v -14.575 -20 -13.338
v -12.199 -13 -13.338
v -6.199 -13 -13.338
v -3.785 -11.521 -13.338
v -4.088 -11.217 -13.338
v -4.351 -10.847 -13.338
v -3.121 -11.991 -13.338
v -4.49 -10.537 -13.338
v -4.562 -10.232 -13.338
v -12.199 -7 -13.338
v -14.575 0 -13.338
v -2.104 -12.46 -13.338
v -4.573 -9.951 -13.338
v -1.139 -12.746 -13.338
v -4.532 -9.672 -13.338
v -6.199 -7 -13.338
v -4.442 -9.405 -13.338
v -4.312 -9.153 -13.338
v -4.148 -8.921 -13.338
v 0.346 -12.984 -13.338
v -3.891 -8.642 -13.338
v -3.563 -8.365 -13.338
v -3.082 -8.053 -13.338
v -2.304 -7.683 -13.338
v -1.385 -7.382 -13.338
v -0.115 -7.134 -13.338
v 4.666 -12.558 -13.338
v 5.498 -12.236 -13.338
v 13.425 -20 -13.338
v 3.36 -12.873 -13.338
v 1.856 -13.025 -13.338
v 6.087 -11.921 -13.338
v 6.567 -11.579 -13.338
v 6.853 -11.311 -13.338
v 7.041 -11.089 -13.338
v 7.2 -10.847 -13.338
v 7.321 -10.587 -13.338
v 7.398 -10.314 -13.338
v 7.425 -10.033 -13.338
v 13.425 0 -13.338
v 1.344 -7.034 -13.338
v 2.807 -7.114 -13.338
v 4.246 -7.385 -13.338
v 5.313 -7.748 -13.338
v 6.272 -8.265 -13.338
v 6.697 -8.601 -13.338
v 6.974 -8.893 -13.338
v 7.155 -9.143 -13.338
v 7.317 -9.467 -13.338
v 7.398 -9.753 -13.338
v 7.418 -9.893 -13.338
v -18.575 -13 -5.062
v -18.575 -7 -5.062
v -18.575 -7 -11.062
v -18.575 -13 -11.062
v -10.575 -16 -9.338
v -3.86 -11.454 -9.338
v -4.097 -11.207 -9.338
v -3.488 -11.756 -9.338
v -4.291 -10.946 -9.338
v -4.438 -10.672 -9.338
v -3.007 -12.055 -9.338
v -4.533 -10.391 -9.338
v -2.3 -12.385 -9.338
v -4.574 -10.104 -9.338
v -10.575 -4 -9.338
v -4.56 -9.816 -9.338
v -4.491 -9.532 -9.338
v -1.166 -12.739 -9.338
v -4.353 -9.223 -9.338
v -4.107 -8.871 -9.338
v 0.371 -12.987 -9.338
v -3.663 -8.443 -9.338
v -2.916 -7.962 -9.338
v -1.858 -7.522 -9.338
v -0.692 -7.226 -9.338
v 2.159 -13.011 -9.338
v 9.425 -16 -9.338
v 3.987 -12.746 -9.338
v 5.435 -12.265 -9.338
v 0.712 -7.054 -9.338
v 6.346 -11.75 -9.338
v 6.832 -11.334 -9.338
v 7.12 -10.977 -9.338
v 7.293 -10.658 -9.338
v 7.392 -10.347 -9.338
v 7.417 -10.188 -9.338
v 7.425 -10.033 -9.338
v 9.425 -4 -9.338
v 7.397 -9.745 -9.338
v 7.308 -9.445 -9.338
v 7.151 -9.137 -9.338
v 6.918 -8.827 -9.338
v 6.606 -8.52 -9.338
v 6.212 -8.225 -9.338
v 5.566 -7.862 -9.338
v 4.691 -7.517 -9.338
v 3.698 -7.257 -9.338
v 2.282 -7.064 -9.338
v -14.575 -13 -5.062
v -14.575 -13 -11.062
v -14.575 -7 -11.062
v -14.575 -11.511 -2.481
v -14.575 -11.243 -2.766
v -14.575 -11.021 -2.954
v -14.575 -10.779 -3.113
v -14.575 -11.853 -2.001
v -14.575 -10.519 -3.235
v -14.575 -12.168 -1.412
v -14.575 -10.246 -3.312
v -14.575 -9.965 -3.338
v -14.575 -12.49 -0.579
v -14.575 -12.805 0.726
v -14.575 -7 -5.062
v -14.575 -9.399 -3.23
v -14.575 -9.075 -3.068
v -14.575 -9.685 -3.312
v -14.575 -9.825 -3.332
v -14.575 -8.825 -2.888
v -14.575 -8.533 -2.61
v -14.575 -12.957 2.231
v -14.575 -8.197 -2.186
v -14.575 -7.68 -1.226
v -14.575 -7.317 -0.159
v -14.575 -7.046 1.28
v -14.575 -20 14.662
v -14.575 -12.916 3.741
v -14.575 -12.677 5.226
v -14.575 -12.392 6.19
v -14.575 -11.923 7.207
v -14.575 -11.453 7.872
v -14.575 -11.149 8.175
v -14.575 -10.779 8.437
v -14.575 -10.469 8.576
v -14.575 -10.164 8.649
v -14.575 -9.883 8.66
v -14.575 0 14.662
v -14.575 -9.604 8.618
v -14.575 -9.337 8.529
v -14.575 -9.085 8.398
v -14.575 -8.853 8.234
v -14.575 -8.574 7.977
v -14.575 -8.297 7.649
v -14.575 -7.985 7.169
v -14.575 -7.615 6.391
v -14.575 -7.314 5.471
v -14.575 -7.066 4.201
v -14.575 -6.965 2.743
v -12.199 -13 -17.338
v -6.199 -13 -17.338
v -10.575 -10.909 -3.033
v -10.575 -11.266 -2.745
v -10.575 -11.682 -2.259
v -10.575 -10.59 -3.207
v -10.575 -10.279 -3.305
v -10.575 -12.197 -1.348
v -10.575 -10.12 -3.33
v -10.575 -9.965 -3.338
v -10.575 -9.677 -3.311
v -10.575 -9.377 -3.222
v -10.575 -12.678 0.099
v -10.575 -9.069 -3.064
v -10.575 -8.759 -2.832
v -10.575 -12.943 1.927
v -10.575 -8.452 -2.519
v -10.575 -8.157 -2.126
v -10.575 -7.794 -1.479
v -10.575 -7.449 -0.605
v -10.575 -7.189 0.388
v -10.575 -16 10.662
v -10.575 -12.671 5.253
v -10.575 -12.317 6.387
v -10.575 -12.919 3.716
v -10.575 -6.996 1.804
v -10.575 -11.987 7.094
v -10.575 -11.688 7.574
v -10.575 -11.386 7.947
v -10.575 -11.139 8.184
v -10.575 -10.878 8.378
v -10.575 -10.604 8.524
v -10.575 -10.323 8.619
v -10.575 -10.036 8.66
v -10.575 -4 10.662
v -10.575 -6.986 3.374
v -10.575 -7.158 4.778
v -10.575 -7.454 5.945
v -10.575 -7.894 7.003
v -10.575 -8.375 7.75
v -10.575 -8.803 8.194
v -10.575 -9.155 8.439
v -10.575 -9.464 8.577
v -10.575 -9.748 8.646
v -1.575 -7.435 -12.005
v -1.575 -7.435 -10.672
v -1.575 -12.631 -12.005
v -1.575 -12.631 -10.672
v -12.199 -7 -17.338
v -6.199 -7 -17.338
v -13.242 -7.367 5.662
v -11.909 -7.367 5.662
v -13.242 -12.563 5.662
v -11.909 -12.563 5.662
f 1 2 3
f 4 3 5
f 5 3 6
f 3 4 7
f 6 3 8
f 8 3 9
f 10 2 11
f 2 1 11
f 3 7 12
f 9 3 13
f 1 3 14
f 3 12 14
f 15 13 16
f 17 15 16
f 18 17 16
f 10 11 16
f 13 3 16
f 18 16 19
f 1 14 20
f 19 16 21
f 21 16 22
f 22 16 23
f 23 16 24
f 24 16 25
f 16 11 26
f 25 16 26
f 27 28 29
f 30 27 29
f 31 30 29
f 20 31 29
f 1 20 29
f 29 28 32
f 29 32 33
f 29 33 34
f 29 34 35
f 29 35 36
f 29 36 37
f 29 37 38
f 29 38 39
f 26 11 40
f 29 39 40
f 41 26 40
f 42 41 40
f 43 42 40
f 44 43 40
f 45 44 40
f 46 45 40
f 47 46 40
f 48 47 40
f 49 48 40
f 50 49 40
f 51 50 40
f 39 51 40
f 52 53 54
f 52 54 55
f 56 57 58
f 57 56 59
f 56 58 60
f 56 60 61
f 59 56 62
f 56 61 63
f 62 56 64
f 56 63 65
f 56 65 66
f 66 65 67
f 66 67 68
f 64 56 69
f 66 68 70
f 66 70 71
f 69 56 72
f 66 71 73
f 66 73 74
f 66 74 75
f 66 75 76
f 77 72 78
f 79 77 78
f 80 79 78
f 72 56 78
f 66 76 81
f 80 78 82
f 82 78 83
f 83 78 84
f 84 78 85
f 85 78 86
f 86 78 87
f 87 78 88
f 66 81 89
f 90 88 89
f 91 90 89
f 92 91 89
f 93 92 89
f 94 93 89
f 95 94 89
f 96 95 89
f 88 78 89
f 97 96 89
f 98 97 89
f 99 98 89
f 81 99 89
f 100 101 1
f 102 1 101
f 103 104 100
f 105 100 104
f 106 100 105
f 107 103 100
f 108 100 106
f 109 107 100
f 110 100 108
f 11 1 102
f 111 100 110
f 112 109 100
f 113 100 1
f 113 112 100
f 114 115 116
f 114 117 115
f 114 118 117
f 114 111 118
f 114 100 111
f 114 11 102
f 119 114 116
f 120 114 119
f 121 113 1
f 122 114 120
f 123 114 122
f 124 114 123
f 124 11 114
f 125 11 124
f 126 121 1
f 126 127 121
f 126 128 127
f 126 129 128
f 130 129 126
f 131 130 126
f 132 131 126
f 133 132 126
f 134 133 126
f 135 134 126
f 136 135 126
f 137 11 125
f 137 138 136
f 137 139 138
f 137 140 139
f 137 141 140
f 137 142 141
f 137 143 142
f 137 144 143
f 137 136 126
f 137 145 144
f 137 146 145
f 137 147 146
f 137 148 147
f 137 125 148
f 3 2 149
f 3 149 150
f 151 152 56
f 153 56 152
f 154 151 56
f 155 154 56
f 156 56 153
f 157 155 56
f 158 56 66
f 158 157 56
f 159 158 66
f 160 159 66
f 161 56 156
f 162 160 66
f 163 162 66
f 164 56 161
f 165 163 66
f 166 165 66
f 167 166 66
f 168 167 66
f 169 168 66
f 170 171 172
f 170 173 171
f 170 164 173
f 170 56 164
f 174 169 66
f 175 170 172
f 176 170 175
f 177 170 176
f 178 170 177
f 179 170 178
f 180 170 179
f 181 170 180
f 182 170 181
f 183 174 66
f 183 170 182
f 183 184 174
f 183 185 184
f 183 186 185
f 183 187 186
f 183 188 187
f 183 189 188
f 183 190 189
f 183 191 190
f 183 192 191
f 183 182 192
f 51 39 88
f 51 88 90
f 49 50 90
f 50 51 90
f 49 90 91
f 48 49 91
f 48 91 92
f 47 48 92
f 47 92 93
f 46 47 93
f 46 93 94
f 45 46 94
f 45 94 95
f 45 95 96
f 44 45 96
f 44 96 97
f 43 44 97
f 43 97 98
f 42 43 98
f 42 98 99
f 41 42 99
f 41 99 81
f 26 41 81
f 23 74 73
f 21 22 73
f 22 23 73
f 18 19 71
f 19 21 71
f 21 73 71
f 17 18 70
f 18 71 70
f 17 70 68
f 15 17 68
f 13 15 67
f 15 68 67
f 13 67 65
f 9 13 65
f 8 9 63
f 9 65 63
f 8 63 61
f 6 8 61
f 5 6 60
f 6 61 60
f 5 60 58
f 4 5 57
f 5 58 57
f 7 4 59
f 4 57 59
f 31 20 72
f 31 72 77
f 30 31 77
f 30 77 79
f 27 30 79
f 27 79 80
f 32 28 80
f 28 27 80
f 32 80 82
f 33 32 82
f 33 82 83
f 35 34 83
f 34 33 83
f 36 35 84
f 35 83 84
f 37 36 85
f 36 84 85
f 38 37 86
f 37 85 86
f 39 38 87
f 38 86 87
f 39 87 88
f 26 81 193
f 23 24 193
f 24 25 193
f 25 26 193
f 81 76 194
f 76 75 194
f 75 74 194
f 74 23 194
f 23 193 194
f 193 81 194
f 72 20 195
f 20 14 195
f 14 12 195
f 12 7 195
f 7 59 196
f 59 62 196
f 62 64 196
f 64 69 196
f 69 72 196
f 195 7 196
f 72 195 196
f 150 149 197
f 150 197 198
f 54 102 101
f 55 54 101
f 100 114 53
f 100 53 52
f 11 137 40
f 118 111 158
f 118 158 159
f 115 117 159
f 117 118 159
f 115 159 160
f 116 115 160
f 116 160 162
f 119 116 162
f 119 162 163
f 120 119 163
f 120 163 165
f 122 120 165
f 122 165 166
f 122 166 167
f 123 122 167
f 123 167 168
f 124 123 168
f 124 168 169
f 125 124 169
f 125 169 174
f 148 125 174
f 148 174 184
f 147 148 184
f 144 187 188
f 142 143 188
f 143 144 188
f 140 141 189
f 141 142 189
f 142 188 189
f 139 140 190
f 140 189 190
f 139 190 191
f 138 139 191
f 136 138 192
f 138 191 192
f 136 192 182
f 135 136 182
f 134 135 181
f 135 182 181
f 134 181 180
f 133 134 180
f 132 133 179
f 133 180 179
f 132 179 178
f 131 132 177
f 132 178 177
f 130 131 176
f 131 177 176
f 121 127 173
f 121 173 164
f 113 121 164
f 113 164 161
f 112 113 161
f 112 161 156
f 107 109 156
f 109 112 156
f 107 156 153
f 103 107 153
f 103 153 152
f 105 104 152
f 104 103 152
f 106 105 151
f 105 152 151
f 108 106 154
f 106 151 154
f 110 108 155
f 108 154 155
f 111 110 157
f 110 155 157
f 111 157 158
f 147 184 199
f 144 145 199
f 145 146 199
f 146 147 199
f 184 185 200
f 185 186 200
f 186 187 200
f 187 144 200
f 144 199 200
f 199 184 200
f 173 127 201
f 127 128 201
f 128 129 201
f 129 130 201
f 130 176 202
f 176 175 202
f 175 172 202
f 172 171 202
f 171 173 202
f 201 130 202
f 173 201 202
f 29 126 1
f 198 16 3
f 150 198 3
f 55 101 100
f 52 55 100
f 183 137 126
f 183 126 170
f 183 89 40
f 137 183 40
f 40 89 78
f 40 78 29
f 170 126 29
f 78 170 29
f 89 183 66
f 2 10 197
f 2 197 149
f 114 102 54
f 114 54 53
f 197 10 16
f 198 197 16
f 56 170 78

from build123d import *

# Parameters (mm, degrees)
F0_W      = 28
F0_H      = 28
F1_DEPTH  = 20
F2_W      = 20
F2_H      = 12
F3_DEPTH  = 24
F4_W      = 12
F4_H      = 20
F5_DEPTH  = 24
F7_DEPTH  = 20.001
F9_DEPTH  = 4.001
F11_DEPTH = 4.001
F12_W     = 6
F12_H     = 6
F13_DEPTH = 4
F14_W     = 6
F14_H     = 6
F15_DEPTH = 4


with BuildPart() as f1:
    # F0 (on Front) → F1 (new body)
    with BuildSketch(Plane.XZ):
        with Locations((-0.575359, 0.661765)):
            Rectangle(F0_W, F0_H)
    extrude(amount=F1_DEPTH)

    # F2 (on face) → F3 (cut)
    with BuildSketch(Plane.XY.offset(14.661765)):
        with Locations((-0.575359, -10)):
            Rectangle(F2_W, F2_H)
    extrude(amount=-F3_DEPTH, mode=Mode.SUBTRACT)

    # F4 (on face) → F5 (cut)
    with BuildSketch(Plane.YZ.offset(13.424641)):
        with Locations((-10, 0.661765)):
            Rectangle(F4_W, F4_H)
    extrude(amount=-F5_DEPTH, mode=Mode.SUBTRACT)

    # F6 (on face) → F7 (cut, through all)
    with BuildSketch(Plane.XZ.offset(20)):
        Polygon((13.424641, 14.661765), (-14.575359, 14.661765), (13.424641, -13.338235), align=None)
    extrude(amount=-F7_DEPTH, mode=Mode.SUBTRACT)

    # F8 (on face) → F9 (cut, through all)
    with BuildSketch(Plane.XY.offset(-9.338235)):
        with BuildLine():
            add(Edge.make_bspline(
                [(7.424687, -10.033242), (7.424687, -4.83709), (-1.575313, -7.435166), (-10.575313, -10.033242), (-1.575313, -12.631319), (7.424687, -15.229395), (7.424687, -10.033242)],
                knots=[0, 0, 0, 2.094395, 2.094395, 4.18879, 4.18879, 6.283185, 6.283185, 6.283185], degree=2, weights=[1, 0.5, 1, 0.5, 1, 0.5, 1]))
        make_face()
    extrude(amount=-F9_DEPTH, mode=Mode.SUBTRACT)

    # F10 (on face) → F11 (cut, through all)
    with BuildSketch(Plane.YZ.offset(-10.575359)):
        with BuildLine():
            add(Edge.make_bspline(
                [(-9.965221, -3.338235), (-4.769069, -3.338235), (-7.367145, 5.661765), (-9.965221, 14.661765), (-12.563298, 5.661765), (-15.161374, -3.338235), (-9.965221, -3.338235)],
                knots=[0, 0, 0, 2.094395, 2.094395, 4.18879, 4.18879, 6.283185, 6.283185, 6.283185], degree=2, weights=[1, 0.5, 1, 0.5, 1, 0.5, 1]))
        make_face()
    extrude(amount=-F11_DEPTH, mode=Mode.SUBTRACT)

    # F12 (on face) → F13 (join)
    with BuildSketch(Plane(origin=(-14.575359, 0, 0), x_dir=(0, -1, 0), z_dir=(-1, 0, 0))):
        with Locations((10.000001, -8.062312)):
            Rectangle(F12_W, F12_H)
    extrude(amount=F13_DEPTH)

    # F14 (on face) → F15 (join)
    with BuildSketch(Plane(origin=(0, 0, -13.338235), x_dir=(1, 0, 0), z_dir=(0, 0, -1))):
        with Locations((-9.199209, 10)):
            Rectangle(F14_W, F14_H)
    extrude(amount=F15_DEPTH)


solid = f1.part
